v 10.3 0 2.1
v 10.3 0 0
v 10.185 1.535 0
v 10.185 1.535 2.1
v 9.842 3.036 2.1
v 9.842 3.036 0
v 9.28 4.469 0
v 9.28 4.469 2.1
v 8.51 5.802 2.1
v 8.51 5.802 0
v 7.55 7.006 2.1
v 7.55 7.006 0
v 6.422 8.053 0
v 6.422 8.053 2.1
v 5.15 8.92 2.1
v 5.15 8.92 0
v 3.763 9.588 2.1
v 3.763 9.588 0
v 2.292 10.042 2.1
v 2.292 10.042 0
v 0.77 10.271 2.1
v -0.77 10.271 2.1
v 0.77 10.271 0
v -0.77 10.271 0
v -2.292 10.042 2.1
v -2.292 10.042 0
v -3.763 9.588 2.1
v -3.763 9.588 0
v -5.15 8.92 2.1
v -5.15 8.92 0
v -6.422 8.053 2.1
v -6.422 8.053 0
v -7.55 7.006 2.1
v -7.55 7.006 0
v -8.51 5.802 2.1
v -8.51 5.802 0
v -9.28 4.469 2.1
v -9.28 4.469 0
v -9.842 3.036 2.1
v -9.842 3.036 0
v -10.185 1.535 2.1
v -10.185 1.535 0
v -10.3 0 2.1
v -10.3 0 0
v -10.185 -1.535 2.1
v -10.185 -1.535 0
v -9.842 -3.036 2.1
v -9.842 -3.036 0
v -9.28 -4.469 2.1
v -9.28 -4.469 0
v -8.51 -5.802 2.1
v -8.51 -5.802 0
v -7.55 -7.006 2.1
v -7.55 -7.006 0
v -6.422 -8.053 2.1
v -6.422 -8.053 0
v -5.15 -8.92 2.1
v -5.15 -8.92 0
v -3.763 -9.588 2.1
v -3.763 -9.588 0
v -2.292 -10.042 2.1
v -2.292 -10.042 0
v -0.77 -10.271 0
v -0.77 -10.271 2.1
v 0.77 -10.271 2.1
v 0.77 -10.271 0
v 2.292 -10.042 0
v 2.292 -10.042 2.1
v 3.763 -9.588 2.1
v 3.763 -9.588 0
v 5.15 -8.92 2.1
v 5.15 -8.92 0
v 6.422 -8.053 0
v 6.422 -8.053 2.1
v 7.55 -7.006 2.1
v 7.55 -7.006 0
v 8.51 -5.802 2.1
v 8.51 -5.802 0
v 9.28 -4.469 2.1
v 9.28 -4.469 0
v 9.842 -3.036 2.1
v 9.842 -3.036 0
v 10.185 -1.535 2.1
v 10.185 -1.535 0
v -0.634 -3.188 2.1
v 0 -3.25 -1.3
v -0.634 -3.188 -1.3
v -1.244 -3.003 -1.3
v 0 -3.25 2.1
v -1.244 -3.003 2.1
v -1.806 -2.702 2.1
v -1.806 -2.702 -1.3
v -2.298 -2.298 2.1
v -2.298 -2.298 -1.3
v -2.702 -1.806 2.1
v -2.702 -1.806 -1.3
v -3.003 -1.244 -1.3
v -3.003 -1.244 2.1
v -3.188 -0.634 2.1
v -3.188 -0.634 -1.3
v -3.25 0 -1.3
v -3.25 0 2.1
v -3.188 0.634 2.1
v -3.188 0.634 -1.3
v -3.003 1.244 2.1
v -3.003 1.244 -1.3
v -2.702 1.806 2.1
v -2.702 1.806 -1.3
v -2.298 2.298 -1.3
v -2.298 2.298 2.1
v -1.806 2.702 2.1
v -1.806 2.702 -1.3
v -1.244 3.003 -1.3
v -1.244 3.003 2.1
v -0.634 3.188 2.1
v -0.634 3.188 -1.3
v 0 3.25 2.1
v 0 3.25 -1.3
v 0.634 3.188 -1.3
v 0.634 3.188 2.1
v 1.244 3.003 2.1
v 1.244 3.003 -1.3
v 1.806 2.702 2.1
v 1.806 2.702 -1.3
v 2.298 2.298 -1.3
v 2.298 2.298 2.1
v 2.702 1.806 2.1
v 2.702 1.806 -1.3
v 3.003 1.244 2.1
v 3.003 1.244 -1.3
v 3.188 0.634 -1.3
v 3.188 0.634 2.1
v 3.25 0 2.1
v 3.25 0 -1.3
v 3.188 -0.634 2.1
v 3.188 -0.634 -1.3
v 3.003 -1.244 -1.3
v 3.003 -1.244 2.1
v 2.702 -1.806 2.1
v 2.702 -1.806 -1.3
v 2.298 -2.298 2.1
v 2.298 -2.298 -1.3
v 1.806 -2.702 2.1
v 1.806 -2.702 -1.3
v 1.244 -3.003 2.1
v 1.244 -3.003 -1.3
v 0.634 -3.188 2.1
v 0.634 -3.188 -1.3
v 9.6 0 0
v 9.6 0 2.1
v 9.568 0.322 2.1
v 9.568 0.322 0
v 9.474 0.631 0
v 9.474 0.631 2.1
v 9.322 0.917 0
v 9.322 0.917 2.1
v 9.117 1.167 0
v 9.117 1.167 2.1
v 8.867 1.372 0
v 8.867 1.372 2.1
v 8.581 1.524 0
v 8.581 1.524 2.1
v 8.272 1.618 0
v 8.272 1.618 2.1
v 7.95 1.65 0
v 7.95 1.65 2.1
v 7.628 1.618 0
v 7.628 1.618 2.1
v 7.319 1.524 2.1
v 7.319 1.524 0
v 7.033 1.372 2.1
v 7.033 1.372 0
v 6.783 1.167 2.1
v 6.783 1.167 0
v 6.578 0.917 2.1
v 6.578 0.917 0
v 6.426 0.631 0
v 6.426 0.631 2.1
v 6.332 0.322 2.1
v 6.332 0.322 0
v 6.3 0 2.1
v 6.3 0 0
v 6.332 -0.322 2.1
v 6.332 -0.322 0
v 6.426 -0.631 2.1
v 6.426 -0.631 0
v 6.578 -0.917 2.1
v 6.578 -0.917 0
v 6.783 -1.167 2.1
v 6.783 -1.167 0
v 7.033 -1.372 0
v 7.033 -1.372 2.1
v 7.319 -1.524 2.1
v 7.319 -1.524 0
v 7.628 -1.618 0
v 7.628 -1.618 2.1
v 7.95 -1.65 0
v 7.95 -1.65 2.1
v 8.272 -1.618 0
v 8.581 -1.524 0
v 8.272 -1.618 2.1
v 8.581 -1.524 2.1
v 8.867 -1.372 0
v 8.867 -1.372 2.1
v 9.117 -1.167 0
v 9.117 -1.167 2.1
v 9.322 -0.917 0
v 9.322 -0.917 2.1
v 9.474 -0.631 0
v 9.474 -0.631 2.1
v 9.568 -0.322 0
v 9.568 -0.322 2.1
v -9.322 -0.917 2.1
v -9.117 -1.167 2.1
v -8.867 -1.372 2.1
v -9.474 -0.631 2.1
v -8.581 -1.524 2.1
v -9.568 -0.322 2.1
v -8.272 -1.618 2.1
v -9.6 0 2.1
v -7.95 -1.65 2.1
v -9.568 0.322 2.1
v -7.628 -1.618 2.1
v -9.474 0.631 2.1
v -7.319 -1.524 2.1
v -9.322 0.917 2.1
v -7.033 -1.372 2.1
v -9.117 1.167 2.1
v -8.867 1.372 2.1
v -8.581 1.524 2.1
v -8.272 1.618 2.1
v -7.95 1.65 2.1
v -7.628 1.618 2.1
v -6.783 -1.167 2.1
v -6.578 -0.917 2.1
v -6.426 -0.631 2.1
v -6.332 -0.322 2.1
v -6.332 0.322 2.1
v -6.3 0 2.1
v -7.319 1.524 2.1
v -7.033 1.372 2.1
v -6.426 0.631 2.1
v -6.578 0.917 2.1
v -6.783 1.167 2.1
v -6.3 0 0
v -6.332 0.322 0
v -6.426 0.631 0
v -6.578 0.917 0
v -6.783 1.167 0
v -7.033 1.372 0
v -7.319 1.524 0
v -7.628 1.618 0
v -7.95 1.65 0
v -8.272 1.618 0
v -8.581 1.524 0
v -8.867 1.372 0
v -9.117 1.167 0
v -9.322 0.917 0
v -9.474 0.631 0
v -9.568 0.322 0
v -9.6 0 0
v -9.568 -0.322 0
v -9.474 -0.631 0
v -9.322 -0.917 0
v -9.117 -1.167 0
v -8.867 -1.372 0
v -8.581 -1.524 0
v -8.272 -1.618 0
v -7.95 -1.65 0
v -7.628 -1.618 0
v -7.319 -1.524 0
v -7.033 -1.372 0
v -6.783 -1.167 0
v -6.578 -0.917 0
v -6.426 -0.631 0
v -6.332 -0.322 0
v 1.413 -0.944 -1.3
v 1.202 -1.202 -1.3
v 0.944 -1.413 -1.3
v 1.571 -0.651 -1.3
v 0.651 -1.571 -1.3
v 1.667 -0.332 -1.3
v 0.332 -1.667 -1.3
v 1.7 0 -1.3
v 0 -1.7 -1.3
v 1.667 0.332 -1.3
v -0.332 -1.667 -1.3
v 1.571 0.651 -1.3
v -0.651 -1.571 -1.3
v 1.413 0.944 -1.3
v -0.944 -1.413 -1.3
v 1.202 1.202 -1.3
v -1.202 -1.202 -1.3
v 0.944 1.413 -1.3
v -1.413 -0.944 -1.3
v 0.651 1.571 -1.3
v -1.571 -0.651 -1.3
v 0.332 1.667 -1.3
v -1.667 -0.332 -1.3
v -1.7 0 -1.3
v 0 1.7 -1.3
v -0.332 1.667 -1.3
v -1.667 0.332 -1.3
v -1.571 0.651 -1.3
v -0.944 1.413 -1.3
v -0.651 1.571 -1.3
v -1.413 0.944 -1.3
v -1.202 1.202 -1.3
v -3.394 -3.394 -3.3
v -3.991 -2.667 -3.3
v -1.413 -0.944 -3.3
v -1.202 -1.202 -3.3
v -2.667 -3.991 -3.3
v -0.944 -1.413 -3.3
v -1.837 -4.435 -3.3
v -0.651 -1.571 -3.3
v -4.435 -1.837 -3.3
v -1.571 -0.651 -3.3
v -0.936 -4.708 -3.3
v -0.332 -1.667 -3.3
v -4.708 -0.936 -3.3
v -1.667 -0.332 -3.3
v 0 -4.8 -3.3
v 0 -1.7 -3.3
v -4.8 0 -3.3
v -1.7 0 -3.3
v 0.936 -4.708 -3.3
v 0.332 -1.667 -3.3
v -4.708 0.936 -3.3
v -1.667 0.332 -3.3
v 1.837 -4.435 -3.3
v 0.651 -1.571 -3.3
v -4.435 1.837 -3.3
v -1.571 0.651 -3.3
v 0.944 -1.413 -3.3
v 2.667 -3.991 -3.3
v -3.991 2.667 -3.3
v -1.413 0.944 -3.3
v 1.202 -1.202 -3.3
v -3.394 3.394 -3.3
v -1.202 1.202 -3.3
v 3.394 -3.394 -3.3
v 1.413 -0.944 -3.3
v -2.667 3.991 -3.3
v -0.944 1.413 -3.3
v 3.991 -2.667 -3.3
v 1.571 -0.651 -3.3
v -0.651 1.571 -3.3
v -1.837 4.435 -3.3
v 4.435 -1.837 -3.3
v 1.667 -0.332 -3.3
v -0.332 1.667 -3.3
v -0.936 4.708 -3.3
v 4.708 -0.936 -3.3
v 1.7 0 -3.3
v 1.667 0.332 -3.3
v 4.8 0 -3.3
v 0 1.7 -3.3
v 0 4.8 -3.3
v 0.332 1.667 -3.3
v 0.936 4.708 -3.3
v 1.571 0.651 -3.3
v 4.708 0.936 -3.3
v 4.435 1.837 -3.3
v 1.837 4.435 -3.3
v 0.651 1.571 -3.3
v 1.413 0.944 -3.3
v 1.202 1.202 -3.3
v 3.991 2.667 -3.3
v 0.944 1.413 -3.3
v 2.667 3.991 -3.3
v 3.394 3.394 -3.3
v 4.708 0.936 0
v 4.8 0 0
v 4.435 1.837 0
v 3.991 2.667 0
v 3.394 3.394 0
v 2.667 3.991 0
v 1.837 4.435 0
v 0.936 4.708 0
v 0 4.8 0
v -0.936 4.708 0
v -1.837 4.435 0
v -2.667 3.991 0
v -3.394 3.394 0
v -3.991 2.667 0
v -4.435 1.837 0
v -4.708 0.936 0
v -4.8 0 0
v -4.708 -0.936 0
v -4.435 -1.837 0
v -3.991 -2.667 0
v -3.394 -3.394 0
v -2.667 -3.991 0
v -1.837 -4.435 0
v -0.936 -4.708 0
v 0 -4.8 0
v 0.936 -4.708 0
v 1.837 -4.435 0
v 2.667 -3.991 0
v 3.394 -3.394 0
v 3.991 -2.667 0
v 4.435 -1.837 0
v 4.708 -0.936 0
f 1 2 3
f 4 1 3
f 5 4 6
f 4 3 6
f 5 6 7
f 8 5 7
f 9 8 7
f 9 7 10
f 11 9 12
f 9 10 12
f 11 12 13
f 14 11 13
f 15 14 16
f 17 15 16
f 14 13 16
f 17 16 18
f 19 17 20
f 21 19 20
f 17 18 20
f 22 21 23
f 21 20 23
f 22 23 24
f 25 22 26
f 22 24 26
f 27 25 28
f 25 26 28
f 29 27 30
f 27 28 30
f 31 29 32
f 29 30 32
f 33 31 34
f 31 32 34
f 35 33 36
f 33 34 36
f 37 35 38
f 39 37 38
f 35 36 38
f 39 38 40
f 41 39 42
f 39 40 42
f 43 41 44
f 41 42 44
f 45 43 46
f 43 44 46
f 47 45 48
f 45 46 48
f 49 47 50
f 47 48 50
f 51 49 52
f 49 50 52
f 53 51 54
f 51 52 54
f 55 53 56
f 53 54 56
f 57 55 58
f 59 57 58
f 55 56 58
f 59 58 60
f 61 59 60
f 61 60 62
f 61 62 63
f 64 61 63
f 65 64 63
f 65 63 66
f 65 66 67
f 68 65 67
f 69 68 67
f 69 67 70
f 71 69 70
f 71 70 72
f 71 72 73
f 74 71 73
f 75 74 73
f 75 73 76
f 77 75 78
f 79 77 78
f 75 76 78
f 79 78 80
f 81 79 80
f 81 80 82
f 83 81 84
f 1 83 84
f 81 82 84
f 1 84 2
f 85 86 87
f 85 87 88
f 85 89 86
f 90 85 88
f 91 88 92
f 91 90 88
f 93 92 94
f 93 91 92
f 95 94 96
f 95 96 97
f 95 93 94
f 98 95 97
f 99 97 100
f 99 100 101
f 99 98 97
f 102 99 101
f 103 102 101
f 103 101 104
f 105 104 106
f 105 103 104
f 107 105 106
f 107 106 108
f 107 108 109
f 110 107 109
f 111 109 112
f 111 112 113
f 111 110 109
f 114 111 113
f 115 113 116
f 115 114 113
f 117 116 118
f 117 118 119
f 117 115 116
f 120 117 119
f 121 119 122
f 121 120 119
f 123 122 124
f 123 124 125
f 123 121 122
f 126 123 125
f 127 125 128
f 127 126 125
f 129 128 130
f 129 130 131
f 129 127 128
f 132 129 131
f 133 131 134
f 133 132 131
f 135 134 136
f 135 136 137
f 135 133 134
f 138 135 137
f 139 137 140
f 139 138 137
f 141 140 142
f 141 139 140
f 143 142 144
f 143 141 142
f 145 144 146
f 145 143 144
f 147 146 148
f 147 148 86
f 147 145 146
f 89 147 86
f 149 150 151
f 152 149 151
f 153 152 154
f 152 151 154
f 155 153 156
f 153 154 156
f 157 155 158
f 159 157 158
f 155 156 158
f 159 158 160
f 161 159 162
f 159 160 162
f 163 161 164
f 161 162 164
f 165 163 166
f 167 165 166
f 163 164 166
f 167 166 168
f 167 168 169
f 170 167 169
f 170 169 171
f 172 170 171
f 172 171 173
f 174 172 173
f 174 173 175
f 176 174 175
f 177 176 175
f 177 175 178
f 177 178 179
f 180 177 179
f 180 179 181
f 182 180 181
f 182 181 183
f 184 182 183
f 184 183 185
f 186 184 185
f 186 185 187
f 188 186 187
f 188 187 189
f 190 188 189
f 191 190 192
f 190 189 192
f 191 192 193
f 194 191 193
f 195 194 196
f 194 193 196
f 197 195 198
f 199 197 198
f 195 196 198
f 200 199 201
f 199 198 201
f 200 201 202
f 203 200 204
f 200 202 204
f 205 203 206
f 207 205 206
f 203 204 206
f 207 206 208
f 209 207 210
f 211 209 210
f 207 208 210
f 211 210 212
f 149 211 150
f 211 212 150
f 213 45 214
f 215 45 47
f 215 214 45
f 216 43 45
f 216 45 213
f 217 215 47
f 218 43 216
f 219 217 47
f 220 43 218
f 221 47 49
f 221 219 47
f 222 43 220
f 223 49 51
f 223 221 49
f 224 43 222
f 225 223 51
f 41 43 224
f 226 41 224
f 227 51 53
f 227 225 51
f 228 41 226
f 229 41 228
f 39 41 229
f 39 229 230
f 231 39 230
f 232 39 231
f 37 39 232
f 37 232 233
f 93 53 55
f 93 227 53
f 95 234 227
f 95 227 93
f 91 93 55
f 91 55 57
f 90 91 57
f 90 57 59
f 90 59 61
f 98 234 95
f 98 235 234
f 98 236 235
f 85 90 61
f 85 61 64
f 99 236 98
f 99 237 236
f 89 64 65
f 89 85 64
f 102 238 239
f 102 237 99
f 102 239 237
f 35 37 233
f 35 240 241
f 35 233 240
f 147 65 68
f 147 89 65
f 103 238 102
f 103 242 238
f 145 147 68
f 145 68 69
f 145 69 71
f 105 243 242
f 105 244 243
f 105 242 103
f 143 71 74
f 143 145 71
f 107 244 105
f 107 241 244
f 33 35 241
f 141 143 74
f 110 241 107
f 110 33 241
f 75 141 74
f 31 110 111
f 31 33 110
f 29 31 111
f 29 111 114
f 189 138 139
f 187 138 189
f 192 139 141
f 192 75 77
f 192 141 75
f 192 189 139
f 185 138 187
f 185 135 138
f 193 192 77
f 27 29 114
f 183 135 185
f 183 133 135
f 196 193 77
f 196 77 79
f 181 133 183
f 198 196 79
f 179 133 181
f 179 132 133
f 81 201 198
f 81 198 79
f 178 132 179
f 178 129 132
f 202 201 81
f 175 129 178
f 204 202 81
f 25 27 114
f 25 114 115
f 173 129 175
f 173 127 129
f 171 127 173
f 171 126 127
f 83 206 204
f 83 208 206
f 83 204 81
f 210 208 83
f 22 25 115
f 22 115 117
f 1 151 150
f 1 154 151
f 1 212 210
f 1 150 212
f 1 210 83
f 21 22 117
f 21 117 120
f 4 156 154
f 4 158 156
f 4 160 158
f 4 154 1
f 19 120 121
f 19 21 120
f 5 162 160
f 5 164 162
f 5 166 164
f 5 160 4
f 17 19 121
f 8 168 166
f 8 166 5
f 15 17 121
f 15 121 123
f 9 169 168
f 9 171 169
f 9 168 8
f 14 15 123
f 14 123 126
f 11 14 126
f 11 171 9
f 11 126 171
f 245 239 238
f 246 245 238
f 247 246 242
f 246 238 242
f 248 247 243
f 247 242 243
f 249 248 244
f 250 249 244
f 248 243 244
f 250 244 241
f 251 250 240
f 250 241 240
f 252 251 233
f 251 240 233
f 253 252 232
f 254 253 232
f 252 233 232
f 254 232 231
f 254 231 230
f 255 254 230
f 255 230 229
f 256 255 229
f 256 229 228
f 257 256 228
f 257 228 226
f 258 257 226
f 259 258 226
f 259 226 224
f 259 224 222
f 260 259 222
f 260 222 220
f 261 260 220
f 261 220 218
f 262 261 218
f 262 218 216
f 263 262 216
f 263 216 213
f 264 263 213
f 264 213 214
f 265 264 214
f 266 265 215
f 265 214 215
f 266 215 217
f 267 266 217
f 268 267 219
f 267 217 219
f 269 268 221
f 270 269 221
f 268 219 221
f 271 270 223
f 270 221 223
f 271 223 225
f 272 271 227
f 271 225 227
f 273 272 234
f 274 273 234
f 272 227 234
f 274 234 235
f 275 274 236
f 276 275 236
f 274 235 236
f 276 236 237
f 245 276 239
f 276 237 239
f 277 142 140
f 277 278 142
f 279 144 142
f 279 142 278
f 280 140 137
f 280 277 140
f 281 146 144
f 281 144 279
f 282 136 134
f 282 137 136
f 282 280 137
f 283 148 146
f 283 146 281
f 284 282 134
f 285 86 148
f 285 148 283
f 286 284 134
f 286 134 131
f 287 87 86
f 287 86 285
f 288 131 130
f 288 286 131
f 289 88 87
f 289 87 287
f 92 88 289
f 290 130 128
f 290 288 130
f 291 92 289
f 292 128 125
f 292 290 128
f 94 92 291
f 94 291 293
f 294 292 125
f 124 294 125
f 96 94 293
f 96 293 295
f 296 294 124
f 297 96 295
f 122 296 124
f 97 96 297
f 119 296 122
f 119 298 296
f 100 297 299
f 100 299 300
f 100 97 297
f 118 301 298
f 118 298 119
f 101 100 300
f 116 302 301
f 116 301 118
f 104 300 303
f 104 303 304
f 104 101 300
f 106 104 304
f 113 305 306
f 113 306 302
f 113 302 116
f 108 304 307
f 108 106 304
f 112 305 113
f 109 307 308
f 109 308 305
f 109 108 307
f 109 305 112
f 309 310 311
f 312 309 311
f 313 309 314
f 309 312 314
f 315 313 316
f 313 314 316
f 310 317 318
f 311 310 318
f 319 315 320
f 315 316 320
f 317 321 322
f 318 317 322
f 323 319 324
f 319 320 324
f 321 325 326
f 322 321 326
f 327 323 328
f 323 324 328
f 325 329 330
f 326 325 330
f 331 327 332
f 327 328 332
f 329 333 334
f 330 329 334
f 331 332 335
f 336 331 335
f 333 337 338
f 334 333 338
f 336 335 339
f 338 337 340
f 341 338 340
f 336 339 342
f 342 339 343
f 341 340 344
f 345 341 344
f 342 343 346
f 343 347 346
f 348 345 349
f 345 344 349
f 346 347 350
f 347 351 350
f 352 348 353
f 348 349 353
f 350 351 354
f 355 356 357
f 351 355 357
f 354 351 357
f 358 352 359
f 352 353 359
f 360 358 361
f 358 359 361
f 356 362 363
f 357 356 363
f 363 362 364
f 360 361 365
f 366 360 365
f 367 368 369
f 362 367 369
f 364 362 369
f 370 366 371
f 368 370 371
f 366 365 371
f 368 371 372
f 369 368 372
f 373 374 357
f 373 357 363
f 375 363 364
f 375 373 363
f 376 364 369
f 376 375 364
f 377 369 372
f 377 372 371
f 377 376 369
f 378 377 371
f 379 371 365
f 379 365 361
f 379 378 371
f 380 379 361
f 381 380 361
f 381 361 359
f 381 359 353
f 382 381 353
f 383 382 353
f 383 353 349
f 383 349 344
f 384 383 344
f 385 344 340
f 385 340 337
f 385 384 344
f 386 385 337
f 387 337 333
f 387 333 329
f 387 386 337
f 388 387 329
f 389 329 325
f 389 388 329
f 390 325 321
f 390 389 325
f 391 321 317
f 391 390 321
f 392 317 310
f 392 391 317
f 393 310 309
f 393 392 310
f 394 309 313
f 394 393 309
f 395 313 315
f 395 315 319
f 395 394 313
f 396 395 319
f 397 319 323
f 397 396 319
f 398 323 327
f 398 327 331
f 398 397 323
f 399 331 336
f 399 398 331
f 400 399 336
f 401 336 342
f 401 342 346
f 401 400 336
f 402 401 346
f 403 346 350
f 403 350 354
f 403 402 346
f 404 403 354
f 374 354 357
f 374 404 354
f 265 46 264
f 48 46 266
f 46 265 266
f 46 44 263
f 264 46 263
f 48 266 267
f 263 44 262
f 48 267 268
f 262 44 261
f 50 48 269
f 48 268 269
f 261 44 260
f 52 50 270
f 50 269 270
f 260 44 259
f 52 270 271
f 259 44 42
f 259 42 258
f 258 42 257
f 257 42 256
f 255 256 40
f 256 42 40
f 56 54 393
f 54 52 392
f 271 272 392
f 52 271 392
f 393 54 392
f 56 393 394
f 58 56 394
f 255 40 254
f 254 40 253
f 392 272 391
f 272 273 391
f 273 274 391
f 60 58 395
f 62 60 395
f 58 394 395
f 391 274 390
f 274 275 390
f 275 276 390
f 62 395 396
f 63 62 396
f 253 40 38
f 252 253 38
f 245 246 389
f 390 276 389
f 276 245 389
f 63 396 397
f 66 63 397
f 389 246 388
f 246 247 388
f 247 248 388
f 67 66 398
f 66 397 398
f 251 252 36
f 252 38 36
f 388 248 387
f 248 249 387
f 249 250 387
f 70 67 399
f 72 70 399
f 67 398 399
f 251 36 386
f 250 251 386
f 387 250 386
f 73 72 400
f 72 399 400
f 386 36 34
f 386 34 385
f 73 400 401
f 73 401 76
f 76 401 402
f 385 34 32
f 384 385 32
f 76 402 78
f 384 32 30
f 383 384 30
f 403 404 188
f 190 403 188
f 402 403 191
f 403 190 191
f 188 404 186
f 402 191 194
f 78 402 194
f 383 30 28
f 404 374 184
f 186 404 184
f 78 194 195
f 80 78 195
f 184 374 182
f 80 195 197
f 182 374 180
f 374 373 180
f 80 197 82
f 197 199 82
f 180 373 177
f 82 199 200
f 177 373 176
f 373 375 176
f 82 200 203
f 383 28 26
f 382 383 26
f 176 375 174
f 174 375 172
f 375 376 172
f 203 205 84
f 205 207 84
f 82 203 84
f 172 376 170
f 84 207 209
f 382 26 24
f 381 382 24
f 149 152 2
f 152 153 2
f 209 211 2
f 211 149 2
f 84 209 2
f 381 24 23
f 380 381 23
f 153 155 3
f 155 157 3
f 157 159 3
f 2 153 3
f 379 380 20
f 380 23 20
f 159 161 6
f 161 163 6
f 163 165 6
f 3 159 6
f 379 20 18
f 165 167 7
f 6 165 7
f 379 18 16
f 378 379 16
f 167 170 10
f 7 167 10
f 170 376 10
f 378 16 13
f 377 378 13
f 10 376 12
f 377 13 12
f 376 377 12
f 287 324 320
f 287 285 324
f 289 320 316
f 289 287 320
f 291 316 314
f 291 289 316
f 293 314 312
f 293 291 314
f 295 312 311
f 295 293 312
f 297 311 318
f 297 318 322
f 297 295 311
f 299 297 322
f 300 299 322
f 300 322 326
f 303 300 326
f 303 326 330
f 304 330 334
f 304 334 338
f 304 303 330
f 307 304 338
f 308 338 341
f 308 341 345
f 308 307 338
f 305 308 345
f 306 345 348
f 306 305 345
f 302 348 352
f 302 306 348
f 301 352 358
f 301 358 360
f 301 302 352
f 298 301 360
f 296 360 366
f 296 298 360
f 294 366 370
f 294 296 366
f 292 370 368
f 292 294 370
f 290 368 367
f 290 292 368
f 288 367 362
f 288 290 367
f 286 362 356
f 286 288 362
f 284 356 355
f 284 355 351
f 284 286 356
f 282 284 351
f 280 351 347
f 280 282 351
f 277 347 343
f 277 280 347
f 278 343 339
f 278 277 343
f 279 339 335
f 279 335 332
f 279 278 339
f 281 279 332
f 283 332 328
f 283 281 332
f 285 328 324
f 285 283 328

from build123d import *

# Parameters (mm, degrees)
ESQUISSE1_R             = 10.3
BOSS_EXTRU_1_DEPTH      = 2.1
ESQUISSE2_R             = 4.8
BOSS_EXTRU_2_DEPTH      = 3.3
ESQUISSE3_R             = 1.65
ENL_V_MAT_EXTRU_1_DEPTH = 16.535121499


with BuildPart() as part:
    # Esquisse1 → Boss.-Extru.1 (new body)
    with BuildSketch(Plane.XY):
        Circle(ESQUISSE1_R)
    extrude(amount=BOSS_EXTRU_1_DEPTH)

    # Esquisse2 → Boss.-Extru.2 (add)
    with BuildSketch(Plane.XY):
        Circle(ESQUISSE2_R)
    extrude(amount=-BOSS_EXTRU_2_DEPTH)

    # Esquisse3 → Enlèv. mat.-Extru.1 (cut, through all)
    with BuildSketch(Plane.XY.offset(2.1)):
        with Locations((7.95, 0)):
            Circle(ESQUISSE3_R)
        with Locations((-7.95, 0)):
            Circle(ESQUISSE3_R)
    extrude(amount=-ENL_V_MAT_EXTRU_1_DEPTH, mode=Mode.SUBTRACT)

    # Esquisse4 → Chambrage pour vis à six pans creux M31 (revolve, cut)
    with BuildSketch(Plane(origin=(0, 0, 2.1), x_dir=(0, -1, 0), z_dir=(1, 0, 0))):
        Polygon((0, 0), (0, 5.4), (1.7, 5.4), (1.7, 3.4), (3.25, 3.4), (3.25, 0), align=None)
    revolve(axis=Axis((0, 0, 8.45), (0, 0, -1)), mode=Mode.SUBTRACT)


solid = part.part
